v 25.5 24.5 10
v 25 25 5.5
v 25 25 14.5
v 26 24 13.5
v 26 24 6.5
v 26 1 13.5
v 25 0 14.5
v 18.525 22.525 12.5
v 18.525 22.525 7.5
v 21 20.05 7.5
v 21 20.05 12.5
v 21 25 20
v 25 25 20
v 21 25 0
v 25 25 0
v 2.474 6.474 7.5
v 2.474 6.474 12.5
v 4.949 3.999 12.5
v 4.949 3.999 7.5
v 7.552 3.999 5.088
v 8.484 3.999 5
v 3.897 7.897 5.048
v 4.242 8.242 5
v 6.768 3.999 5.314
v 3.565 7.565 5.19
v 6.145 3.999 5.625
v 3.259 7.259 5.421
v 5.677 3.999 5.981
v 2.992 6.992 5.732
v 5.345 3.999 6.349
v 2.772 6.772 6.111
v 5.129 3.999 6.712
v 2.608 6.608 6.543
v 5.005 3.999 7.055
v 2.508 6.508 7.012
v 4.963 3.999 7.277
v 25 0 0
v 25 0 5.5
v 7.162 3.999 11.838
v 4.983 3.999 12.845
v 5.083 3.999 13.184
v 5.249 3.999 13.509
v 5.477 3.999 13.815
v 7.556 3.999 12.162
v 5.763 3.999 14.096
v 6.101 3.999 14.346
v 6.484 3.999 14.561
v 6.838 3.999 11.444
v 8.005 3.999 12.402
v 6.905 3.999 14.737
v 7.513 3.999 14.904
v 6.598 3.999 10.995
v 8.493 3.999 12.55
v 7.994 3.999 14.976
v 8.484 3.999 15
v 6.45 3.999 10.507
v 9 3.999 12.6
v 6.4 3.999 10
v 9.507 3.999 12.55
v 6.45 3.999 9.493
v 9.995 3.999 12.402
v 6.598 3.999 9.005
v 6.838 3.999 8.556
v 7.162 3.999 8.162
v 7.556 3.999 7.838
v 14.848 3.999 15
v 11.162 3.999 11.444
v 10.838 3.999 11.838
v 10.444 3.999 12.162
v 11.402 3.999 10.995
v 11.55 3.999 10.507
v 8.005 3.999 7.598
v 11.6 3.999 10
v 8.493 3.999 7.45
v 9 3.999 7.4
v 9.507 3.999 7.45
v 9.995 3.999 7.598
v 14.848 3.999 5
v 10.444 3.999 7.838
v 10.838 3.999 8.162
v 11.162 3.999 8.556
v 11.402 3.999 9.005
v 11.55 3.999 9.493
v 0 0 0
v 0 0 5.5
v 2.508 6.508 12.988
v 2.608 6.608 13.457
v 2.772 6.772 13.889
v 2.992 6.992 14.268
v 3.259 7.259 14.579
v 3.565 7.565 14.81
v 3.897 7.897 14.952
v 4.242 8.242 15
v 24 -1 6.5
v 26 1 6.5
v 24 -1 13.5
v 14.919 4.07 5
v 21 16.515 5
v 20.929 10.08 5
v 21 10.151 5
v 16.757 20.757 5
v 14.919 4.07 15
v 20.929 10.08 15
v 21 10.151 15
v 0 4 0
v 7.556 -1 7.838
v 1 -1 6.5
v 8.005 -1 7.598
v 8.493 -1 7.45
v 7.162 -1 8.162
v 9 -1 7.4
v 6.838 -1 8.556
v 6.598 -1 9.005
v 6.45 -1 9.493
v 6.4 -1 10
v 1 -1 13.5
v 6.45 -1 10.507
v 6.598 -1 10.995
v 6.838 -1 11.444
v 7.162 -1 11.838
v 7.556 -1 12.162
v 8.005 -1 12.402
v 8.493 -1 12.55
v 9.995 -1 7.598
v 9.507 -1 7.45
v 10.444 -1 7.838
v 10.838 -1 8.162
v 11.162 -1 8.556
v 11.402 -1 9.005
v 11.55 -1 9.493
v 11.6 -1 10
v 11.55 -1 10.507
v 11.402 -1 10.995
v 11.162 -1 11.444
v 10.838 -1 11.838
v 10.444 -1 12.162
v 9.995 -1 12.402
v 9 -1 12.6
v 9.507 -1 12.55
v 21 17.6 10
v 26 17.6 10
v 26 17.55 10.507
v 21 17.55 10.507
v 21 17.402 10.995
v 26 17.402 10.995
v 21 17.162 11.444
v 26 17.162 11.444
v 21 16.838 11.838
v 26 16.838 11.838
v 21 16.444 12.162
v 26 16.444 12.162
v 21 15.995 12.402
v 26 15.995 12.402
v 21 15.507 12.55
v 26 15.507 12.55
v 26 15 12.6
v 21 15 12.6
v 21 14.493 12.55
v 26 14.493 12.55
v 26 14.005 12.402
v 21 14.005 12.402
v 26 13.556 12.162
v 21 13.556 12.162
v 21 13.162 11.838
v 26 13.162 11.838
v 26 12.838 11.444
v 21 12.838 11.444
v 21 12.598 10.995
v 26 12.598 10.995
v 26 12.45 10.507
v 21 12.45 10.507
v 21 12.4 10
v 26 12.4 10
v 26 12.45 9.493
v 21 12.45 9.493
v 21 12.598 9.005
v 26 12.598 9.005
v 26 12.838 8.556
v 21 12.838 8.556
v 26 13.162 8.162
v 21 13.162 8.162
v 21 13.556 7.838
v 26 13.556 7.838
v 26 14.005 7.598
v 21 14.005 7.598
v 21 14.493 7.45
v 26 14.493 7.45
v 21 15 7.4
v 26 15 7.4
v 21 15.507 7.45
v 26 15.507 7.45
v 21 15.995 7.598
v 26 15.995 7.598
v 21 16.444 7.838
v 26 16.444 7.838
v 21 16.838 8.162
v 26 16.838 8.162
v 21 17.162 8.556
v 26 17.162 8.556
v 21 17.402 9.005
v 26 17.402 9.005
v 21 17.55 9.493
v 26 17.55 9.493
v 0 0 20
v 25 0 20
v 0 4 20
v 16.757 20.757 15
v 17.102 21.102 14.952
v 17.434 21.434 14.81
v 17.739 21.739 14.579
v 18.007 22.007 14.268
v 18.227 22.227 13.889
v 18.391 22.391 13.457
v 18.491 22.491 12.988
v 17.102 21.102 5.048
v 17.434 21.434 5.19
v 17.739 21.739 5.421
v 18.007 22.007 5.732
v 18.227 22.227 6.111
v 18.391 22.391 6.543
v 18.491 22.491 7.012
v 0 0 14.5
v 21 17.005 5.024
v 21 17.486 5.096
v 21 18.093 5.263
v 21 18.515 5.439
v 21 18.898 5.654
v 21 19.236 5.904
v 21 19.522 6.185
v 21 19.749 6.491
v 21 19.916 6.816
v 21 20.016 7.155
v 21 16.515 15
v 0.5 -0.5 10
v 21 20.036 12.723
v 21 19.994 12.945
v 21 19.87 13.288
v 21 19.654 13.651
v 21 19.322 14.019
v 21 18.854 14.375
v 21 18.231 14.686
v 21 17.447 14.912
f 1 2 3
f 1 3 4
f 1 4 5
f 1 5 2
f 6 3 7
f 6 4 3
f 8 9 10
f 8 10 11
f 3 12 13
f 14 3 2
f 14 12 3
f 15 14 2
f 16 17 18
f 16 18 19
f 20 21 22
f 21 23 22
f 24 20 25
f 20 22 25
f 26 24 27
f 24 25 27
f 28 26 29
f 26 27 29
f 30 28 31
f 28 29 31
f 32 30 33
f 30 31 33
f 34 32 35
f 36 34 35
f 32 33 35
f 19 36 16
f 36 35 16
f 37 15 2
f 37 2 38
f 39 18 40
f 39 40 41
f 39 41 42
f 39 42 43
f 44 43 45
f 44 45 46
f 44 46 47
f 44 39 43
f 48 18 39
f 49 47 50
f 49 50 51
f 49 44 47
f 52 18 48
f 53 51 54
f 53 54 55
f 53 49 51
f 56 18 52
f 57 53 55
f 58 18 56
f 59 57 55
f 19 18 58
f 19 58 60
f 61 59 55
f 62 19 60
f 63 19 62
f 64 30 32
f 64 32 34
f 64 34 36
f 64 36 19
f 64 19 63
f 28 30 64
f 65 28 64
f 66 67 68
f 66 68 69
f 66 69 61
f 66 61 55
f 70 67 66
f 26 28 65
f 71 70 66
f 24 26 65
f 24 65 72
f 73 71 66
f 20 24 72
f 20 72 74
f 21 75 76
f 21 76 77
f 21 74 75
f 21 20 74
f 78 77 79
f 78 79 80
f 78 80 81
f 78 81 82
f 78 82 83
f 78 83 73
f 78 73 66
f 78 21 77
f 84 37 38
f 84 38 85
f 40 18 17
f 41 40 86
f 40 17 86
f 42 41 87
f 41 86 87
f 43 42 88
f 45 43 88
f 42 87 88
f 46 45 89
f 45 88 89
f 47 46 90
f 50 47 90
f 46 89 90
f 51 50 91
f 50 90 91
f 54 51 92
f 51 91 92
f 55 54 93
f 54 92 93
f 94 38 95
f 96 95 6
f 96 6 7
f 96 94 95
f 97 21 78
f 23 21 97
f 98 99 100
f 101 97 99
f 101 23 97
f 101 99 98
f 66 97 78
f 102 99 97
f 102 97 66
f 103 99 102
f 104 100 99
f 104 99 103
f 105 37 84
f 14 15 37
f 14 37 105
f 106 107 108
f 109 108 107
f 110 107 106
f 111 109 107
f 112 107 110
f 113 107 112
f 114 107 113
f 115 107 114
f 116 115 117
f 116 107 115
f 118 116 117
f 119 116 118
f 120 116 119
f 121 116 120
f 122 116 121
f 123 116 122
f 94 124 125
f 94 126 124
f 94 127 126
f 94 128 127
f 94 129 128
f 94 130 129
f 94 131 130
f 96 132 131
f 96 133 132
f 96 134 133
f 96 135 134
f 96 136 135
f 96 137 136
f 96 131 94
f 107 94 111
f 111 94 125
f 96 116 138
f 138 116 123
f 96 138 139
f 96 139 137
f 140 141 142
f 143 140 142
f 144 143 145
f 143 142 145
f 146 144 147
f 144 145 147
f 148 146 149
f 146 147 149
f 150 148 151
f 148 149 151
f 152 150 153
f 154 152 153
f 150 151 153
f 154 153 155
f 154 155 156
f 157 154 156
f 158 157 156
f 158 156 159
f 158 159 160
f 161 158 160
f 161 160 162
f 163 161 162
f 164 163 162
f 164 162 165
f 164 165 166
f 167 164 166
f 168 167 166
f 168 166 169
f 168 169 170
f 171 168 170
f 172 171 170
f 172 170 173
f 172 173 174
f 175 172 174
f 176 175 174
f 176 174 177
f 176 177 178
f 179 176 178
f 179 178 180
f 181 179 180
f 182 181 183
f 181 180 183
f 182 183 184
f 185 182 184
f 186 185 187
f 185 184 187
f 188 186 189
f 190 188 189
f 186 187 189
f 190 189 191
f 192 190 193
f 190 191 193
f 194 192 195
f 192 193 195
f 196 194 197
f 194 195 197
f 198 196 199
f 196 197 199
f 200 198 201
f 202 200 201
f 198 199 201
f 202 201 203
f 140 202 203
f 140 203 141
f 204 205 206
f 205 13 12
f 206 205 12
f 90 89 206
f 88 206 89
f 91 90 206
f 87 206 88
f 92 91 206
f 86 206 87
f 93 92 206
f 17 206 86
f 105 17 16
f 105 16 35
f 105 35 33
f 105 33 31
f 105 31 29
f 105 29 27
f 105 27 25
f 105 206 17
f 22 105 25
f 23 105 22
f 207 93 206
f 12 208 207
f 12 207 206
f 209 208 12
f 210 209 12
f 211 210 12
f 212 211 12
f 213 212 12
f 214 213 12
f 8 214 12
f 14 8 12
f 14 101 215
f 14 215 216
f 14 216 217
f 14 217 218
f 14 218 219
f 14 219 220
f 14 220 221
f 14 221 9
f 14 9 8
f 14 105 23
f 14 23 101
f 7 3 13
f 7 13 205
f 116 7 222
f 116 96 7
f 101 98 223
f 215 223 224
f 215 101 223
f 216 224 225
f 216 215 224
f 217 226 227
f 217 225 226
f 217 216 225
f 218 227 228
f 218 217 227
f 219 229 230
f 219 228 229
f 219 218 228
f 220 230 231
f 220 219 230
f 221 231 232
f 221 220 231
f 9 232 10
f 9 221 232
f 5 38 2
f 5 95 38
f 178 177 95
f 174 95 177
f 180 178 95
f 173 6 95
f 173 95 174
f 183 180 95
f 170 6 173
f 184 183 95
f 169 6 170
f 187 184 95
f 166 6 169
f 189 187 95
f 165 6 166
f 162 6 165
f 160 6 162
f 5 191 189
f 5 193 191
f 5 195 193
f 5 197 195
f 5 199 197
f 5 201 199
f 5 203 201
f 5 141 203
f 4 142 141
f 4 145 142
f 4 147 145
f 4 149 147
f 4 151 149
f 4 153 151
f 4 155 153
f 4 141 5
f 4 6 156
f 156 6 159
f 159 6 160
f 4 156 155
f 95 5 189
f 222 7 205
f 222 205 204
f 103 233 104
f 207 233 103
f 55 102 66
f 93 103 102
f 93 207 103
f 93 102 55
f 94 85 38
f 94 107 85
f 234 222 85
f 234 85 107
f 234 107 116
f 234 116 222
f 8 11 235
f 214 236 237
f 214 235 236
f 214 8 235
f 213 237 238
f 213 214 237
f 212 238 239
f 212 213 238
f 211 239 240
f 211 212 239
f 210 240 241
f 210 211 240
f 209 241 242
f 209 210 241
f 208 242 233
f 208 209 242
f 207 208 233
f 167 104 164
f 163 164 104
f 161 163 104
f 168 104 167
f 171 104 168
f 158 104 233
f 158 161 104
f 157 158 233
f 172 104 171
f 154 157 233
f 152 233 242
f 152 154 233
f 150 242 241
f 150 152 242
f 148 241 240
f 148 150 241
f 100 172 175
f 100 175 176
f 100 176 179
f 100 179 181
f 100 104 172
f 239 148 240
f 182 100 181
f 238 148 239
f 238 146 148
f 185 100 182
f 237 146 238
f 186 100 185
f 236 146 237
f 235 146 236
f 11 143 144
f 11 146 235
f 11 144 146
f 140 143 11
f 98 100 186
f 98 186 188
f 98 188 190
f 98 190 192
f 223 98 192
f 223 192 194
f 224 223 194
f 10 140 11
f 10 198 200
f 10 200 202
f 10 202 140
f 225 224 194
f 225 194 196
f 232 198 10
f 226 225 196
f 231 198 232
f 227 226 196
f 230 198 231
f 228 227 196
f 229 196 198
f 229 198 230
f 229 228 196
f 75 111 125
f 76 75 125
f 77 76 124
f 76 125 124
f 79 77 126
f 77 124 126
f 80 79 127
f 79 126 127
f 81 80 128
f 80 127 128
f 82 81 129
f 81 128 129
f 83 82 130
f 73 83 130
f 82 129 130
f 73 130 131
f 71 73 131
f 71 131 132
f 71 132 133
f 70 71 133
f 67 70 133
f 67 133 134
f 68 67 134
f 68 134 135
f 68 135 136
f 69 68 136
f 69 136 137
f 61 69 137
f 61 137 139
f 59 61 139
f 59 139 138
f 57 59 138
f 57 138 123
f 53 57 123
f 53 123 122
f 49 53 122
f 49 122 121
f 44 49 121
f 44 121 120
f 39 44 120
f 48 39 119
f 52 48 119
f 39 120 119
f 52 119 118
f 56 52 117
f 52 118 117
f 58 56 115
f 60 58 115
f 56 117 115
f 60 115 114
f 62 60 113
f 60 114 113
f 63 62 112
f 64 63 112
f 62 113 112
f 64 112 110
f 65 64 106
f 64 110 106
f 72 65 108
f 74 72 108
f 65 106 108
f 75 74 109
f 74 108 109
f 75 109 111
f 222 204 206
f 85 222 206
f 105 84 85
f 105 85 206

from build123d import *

# Parameters (mm, degrees)
BOSS_EXTRUDE1_DEPTH = 20
SKETCH2_W           = 9
SKETCH2_H           = 25
BOSS_EXTRUDE2_DEPTH = 1
BOSS_EXTRUDE2_TAPER = 45
SKETCH3_W           = 25
SKETCH3_H           = 9
BOSS_EXTRUDE3_DEPTH = 1
BOSS_EXTRUDE3_TAPER = 45
CUT_EXTRUDE3_DEPTH  = 3.5
SKETCH9_W           = 10
SKETCH9_H           = 8.5
CUT_EXTRUDE4_DEPTH  = 7
CHAMFER3_START      = 7.5
CHAMFER3_DEPTH      = 5
CHAMFER3_START_2    = 5
CHAMFER3_2_DEPTH    = 10
CHAMFER3_START_3    = 0.671572875
CHAMFER3_3_DEPTH    = 2.5
CUT_EXTRUDE5_REACH  = 43.857
SKETCH4_R           = 2.6
CUT_EXTRUDE6_REACH  = 43.243
SKETCH5_R           = 2.6


with BuildPart() as part:
    # Sketch1 → Boss-Extrude1 (new body)
    with BuildSketch(Plane.XY):
        Polygon((0, 0), (0, 4), (21, 25), (25, 25), (25, 0), align=None)
    extrude(amount=BOSS_EXTRUDE1_DEPTH)

    # Sketch2 → Boss-Extrude2 (add)
    with BuildSketch(Plane(origin=(25, 0, 0), x_dir=(0, 0, -1), z_dir=(1, 0, 0))):
        with Locations((-10, 12.5)):
            Rectangle(SKETCH2_W, SKETCH2_H)
    extrude(amount=BOSS_EXTRUDE2_DEPTH, taper=BOSS_EXTRUDE2_TAPER)

    # Sketch3 → Boss-Extrude3 (add)
    with BuildSketch(Plane.XZ):
        with Locations((12.5, 10)):
            Rectangle(SKETCH3_W, SKETCH3_H)
    extrude(amount=BOSS_EXTRUDE3_DEPTH, taper=BOSS_EXTRUDE3_TAPER)

    # Sketch7 → Cut-Extrude3 (cut)
    with BuildSketch(Plane(origin=(-2, 2, 0), x_dir=(0, 0, 1), z_dir=(-0.7071067811865464, 0.7071067811865487, 0))):
        with BuildLine():
            Line((7.5, 29.026911935), (12.5, 29.026911935))
            ThreePointArc((12.5, 29.026911935), (14.267766953, 28.294678888), (15, 26.526911935))
            Line((15, 26.526911935), (15, 8.826911935))
            ThreePointArc((15, 8.826911935), (14.267766953, 7.059144982), (12.5, 6.326911935))
            Line((12.5, 6.326911935), (7.5, 6.326911935))
            ThreePointArc((7.5, 6.326911935), (5.732233047, 7.059144982), (5, 8.826911935))
            Line((5, 8.826911935), (5, 26.526911935))
            ThreePointArc((5, 26.526911935), (5.732233047, 28.294678888), (7.5, 29.026911935))
        make_face()
    extrude(amount=-CUT_EXTRUDE3_DEPTH, mode=Mode.SUBTRACT)

    # Sketch9 → Cut-Extrude4 (cut)
    with BuildSketch(Plane(origin=(0.474873734, -0.474873734, 0), x_dir=(0, 0, 1), z_dir=(-0.7071067811865464, 0.7071067811865487, 0))):
        with Locations((10, 17.676911935)):
            Rectangle(SKETCH9_W, SKETCH9_H)
    extrude(amount=-CUT_EXTRUDE4_DEPTH, mode=Mode.SUBTRACT)

    # Chamfer3: read off the stored shape, not the designer's step
    # Chamfer3 outline → Chamfer3 (cut)
    with BuildSketch(Plane.XY.offset(CHAMFER3_START)):
        Polygon((15.979541854, 15.029794385), (20.929289322, 10.080046917), (21, 10.150757595), (21, 20.050252532), align=None)
        Polygon((4.948676067, 3.998928599), (14.848171004, 3.998928599), (14.918881682, 4.069639277), (9.969134213, 9.019386745), align=None)
    extrude(amount=CHAMFER3_DEPTH, mode=Mode.SUBTRACT)

    # Chamfer3 2 outline → Chamfer3 2 (cut)
    with BuildSketch(Plane.XY.offset(CHAMFER3_START_2)):
        Polygon((15.979541854, 15.029794385), (20.929289322, 10.080046917), (21, 10.150757595), (21, 20.050252532), align=None)
        Polygon((4.948676067, 3.998928599), (14.848171004, 3.998928599), (14.918881682, 4.069639277), (9.969134213, 9.019386745), align=None)
    extrude(amount=CHAMFER3_2_DEPTH, mode=Mode.SUBTRACT)

    # Chamfer3 3 outline → Chamfer3 3 (add)
    with BuildSketch(Plane(origin=(0, 0, 0), x_dir=(0.707106781186549, 0.707106781186546, 0), z_dir=(0.707106781186546, -0.707106781186549, 0)).offset(CHAMFER3_START_3)):
        with BuildLine():
            Line((6.326911935, 5.000000001), (8.826911935, 5))
            ThreePointArc((8.826911935, 5), (7.059144982, 5.732233047), (6.326911935, 7.5))
            Line((6.326911935, 7.5), (6.326911935, 5.000000001))
        make_face()
        with BuildLine():
            ThreePointArc((29.026911935, 7.5), (28.294678888, 5.732233047), (26.526911935, 5))
            Line((26.526911935, 5), (29.026911935, 5.000000001))
            Line((29.026911935, 5.000000001), (29.026911935, 7.5))
        make_face()
        with BuildLine():
            Line((6.326911935, 14.999999999), (6.326911935, 12.5))
            ThreePointArc((6.326911935, 12.5), (7.059144982, 14.267766953), (8.826911935, 15))
            Line((8.826911935, 15), (6.326911935, 14.999999999))
        make_face()
        with BuildLine():
            ThreePointArc((26.526911935, 15), (28.294678888, 14.267766953), (29.026911935, 12.5))
            Line((29.026911935, 12.5), (29.026911935, 14.999999999))
            Line((29.026911935, 14.999999999), (26.526911935, 15))
        make_face()
    extrude(amount=CHAMFER3_3_DEPTH)

    # Sketch4 → Cut-Extrude5 (cut, up to next)
    with BuildSketch(Plane.XZ.offset(1), mode=Mode.PRIVATE) as cut_extrude5_sk1:
        with Locations(Location((9, 10, 0), (0, 0, 270))):
            Circle(SKETCH4_R)
    cut_extrude5_tool1 = extrude(cut_extrude5_sk1.sketch, amount=-CUT_EXTRUDE5_REACH, mode=Mode.PRIVATE) & part.part
    add(cut_extrude5_tool1.solids().sort_by_distance((9, -1, 10))[0], mode=Mode.SUBTRACT)

    # Sketch5 → Cut-Extrude6 (cut, up to next)
    with BuildSketch(Plane(origin=(26, 0, 0), x_dir=(0, 0, -1), z_dir=(1, 0, 0)), mode=Mode.PRIVATE) as cut_extrude6_sk1:
        with Locations(Location((-10, 15, 0), (0, 0, 90))):
            Circle(SKETCH5_R)
    cut_extrude6_tool1 = extrude(cut_extrude6_sk1.sketch, amount=-CUT_EXTRUDE6_REACH, mode=Mode.PRIVATE) & part.part
    add(cut_extrude6_tool1.solids().sort_by_distance((26, 15, 10))[0], mode=Mode.SUBTRACT)


solid = part.part
